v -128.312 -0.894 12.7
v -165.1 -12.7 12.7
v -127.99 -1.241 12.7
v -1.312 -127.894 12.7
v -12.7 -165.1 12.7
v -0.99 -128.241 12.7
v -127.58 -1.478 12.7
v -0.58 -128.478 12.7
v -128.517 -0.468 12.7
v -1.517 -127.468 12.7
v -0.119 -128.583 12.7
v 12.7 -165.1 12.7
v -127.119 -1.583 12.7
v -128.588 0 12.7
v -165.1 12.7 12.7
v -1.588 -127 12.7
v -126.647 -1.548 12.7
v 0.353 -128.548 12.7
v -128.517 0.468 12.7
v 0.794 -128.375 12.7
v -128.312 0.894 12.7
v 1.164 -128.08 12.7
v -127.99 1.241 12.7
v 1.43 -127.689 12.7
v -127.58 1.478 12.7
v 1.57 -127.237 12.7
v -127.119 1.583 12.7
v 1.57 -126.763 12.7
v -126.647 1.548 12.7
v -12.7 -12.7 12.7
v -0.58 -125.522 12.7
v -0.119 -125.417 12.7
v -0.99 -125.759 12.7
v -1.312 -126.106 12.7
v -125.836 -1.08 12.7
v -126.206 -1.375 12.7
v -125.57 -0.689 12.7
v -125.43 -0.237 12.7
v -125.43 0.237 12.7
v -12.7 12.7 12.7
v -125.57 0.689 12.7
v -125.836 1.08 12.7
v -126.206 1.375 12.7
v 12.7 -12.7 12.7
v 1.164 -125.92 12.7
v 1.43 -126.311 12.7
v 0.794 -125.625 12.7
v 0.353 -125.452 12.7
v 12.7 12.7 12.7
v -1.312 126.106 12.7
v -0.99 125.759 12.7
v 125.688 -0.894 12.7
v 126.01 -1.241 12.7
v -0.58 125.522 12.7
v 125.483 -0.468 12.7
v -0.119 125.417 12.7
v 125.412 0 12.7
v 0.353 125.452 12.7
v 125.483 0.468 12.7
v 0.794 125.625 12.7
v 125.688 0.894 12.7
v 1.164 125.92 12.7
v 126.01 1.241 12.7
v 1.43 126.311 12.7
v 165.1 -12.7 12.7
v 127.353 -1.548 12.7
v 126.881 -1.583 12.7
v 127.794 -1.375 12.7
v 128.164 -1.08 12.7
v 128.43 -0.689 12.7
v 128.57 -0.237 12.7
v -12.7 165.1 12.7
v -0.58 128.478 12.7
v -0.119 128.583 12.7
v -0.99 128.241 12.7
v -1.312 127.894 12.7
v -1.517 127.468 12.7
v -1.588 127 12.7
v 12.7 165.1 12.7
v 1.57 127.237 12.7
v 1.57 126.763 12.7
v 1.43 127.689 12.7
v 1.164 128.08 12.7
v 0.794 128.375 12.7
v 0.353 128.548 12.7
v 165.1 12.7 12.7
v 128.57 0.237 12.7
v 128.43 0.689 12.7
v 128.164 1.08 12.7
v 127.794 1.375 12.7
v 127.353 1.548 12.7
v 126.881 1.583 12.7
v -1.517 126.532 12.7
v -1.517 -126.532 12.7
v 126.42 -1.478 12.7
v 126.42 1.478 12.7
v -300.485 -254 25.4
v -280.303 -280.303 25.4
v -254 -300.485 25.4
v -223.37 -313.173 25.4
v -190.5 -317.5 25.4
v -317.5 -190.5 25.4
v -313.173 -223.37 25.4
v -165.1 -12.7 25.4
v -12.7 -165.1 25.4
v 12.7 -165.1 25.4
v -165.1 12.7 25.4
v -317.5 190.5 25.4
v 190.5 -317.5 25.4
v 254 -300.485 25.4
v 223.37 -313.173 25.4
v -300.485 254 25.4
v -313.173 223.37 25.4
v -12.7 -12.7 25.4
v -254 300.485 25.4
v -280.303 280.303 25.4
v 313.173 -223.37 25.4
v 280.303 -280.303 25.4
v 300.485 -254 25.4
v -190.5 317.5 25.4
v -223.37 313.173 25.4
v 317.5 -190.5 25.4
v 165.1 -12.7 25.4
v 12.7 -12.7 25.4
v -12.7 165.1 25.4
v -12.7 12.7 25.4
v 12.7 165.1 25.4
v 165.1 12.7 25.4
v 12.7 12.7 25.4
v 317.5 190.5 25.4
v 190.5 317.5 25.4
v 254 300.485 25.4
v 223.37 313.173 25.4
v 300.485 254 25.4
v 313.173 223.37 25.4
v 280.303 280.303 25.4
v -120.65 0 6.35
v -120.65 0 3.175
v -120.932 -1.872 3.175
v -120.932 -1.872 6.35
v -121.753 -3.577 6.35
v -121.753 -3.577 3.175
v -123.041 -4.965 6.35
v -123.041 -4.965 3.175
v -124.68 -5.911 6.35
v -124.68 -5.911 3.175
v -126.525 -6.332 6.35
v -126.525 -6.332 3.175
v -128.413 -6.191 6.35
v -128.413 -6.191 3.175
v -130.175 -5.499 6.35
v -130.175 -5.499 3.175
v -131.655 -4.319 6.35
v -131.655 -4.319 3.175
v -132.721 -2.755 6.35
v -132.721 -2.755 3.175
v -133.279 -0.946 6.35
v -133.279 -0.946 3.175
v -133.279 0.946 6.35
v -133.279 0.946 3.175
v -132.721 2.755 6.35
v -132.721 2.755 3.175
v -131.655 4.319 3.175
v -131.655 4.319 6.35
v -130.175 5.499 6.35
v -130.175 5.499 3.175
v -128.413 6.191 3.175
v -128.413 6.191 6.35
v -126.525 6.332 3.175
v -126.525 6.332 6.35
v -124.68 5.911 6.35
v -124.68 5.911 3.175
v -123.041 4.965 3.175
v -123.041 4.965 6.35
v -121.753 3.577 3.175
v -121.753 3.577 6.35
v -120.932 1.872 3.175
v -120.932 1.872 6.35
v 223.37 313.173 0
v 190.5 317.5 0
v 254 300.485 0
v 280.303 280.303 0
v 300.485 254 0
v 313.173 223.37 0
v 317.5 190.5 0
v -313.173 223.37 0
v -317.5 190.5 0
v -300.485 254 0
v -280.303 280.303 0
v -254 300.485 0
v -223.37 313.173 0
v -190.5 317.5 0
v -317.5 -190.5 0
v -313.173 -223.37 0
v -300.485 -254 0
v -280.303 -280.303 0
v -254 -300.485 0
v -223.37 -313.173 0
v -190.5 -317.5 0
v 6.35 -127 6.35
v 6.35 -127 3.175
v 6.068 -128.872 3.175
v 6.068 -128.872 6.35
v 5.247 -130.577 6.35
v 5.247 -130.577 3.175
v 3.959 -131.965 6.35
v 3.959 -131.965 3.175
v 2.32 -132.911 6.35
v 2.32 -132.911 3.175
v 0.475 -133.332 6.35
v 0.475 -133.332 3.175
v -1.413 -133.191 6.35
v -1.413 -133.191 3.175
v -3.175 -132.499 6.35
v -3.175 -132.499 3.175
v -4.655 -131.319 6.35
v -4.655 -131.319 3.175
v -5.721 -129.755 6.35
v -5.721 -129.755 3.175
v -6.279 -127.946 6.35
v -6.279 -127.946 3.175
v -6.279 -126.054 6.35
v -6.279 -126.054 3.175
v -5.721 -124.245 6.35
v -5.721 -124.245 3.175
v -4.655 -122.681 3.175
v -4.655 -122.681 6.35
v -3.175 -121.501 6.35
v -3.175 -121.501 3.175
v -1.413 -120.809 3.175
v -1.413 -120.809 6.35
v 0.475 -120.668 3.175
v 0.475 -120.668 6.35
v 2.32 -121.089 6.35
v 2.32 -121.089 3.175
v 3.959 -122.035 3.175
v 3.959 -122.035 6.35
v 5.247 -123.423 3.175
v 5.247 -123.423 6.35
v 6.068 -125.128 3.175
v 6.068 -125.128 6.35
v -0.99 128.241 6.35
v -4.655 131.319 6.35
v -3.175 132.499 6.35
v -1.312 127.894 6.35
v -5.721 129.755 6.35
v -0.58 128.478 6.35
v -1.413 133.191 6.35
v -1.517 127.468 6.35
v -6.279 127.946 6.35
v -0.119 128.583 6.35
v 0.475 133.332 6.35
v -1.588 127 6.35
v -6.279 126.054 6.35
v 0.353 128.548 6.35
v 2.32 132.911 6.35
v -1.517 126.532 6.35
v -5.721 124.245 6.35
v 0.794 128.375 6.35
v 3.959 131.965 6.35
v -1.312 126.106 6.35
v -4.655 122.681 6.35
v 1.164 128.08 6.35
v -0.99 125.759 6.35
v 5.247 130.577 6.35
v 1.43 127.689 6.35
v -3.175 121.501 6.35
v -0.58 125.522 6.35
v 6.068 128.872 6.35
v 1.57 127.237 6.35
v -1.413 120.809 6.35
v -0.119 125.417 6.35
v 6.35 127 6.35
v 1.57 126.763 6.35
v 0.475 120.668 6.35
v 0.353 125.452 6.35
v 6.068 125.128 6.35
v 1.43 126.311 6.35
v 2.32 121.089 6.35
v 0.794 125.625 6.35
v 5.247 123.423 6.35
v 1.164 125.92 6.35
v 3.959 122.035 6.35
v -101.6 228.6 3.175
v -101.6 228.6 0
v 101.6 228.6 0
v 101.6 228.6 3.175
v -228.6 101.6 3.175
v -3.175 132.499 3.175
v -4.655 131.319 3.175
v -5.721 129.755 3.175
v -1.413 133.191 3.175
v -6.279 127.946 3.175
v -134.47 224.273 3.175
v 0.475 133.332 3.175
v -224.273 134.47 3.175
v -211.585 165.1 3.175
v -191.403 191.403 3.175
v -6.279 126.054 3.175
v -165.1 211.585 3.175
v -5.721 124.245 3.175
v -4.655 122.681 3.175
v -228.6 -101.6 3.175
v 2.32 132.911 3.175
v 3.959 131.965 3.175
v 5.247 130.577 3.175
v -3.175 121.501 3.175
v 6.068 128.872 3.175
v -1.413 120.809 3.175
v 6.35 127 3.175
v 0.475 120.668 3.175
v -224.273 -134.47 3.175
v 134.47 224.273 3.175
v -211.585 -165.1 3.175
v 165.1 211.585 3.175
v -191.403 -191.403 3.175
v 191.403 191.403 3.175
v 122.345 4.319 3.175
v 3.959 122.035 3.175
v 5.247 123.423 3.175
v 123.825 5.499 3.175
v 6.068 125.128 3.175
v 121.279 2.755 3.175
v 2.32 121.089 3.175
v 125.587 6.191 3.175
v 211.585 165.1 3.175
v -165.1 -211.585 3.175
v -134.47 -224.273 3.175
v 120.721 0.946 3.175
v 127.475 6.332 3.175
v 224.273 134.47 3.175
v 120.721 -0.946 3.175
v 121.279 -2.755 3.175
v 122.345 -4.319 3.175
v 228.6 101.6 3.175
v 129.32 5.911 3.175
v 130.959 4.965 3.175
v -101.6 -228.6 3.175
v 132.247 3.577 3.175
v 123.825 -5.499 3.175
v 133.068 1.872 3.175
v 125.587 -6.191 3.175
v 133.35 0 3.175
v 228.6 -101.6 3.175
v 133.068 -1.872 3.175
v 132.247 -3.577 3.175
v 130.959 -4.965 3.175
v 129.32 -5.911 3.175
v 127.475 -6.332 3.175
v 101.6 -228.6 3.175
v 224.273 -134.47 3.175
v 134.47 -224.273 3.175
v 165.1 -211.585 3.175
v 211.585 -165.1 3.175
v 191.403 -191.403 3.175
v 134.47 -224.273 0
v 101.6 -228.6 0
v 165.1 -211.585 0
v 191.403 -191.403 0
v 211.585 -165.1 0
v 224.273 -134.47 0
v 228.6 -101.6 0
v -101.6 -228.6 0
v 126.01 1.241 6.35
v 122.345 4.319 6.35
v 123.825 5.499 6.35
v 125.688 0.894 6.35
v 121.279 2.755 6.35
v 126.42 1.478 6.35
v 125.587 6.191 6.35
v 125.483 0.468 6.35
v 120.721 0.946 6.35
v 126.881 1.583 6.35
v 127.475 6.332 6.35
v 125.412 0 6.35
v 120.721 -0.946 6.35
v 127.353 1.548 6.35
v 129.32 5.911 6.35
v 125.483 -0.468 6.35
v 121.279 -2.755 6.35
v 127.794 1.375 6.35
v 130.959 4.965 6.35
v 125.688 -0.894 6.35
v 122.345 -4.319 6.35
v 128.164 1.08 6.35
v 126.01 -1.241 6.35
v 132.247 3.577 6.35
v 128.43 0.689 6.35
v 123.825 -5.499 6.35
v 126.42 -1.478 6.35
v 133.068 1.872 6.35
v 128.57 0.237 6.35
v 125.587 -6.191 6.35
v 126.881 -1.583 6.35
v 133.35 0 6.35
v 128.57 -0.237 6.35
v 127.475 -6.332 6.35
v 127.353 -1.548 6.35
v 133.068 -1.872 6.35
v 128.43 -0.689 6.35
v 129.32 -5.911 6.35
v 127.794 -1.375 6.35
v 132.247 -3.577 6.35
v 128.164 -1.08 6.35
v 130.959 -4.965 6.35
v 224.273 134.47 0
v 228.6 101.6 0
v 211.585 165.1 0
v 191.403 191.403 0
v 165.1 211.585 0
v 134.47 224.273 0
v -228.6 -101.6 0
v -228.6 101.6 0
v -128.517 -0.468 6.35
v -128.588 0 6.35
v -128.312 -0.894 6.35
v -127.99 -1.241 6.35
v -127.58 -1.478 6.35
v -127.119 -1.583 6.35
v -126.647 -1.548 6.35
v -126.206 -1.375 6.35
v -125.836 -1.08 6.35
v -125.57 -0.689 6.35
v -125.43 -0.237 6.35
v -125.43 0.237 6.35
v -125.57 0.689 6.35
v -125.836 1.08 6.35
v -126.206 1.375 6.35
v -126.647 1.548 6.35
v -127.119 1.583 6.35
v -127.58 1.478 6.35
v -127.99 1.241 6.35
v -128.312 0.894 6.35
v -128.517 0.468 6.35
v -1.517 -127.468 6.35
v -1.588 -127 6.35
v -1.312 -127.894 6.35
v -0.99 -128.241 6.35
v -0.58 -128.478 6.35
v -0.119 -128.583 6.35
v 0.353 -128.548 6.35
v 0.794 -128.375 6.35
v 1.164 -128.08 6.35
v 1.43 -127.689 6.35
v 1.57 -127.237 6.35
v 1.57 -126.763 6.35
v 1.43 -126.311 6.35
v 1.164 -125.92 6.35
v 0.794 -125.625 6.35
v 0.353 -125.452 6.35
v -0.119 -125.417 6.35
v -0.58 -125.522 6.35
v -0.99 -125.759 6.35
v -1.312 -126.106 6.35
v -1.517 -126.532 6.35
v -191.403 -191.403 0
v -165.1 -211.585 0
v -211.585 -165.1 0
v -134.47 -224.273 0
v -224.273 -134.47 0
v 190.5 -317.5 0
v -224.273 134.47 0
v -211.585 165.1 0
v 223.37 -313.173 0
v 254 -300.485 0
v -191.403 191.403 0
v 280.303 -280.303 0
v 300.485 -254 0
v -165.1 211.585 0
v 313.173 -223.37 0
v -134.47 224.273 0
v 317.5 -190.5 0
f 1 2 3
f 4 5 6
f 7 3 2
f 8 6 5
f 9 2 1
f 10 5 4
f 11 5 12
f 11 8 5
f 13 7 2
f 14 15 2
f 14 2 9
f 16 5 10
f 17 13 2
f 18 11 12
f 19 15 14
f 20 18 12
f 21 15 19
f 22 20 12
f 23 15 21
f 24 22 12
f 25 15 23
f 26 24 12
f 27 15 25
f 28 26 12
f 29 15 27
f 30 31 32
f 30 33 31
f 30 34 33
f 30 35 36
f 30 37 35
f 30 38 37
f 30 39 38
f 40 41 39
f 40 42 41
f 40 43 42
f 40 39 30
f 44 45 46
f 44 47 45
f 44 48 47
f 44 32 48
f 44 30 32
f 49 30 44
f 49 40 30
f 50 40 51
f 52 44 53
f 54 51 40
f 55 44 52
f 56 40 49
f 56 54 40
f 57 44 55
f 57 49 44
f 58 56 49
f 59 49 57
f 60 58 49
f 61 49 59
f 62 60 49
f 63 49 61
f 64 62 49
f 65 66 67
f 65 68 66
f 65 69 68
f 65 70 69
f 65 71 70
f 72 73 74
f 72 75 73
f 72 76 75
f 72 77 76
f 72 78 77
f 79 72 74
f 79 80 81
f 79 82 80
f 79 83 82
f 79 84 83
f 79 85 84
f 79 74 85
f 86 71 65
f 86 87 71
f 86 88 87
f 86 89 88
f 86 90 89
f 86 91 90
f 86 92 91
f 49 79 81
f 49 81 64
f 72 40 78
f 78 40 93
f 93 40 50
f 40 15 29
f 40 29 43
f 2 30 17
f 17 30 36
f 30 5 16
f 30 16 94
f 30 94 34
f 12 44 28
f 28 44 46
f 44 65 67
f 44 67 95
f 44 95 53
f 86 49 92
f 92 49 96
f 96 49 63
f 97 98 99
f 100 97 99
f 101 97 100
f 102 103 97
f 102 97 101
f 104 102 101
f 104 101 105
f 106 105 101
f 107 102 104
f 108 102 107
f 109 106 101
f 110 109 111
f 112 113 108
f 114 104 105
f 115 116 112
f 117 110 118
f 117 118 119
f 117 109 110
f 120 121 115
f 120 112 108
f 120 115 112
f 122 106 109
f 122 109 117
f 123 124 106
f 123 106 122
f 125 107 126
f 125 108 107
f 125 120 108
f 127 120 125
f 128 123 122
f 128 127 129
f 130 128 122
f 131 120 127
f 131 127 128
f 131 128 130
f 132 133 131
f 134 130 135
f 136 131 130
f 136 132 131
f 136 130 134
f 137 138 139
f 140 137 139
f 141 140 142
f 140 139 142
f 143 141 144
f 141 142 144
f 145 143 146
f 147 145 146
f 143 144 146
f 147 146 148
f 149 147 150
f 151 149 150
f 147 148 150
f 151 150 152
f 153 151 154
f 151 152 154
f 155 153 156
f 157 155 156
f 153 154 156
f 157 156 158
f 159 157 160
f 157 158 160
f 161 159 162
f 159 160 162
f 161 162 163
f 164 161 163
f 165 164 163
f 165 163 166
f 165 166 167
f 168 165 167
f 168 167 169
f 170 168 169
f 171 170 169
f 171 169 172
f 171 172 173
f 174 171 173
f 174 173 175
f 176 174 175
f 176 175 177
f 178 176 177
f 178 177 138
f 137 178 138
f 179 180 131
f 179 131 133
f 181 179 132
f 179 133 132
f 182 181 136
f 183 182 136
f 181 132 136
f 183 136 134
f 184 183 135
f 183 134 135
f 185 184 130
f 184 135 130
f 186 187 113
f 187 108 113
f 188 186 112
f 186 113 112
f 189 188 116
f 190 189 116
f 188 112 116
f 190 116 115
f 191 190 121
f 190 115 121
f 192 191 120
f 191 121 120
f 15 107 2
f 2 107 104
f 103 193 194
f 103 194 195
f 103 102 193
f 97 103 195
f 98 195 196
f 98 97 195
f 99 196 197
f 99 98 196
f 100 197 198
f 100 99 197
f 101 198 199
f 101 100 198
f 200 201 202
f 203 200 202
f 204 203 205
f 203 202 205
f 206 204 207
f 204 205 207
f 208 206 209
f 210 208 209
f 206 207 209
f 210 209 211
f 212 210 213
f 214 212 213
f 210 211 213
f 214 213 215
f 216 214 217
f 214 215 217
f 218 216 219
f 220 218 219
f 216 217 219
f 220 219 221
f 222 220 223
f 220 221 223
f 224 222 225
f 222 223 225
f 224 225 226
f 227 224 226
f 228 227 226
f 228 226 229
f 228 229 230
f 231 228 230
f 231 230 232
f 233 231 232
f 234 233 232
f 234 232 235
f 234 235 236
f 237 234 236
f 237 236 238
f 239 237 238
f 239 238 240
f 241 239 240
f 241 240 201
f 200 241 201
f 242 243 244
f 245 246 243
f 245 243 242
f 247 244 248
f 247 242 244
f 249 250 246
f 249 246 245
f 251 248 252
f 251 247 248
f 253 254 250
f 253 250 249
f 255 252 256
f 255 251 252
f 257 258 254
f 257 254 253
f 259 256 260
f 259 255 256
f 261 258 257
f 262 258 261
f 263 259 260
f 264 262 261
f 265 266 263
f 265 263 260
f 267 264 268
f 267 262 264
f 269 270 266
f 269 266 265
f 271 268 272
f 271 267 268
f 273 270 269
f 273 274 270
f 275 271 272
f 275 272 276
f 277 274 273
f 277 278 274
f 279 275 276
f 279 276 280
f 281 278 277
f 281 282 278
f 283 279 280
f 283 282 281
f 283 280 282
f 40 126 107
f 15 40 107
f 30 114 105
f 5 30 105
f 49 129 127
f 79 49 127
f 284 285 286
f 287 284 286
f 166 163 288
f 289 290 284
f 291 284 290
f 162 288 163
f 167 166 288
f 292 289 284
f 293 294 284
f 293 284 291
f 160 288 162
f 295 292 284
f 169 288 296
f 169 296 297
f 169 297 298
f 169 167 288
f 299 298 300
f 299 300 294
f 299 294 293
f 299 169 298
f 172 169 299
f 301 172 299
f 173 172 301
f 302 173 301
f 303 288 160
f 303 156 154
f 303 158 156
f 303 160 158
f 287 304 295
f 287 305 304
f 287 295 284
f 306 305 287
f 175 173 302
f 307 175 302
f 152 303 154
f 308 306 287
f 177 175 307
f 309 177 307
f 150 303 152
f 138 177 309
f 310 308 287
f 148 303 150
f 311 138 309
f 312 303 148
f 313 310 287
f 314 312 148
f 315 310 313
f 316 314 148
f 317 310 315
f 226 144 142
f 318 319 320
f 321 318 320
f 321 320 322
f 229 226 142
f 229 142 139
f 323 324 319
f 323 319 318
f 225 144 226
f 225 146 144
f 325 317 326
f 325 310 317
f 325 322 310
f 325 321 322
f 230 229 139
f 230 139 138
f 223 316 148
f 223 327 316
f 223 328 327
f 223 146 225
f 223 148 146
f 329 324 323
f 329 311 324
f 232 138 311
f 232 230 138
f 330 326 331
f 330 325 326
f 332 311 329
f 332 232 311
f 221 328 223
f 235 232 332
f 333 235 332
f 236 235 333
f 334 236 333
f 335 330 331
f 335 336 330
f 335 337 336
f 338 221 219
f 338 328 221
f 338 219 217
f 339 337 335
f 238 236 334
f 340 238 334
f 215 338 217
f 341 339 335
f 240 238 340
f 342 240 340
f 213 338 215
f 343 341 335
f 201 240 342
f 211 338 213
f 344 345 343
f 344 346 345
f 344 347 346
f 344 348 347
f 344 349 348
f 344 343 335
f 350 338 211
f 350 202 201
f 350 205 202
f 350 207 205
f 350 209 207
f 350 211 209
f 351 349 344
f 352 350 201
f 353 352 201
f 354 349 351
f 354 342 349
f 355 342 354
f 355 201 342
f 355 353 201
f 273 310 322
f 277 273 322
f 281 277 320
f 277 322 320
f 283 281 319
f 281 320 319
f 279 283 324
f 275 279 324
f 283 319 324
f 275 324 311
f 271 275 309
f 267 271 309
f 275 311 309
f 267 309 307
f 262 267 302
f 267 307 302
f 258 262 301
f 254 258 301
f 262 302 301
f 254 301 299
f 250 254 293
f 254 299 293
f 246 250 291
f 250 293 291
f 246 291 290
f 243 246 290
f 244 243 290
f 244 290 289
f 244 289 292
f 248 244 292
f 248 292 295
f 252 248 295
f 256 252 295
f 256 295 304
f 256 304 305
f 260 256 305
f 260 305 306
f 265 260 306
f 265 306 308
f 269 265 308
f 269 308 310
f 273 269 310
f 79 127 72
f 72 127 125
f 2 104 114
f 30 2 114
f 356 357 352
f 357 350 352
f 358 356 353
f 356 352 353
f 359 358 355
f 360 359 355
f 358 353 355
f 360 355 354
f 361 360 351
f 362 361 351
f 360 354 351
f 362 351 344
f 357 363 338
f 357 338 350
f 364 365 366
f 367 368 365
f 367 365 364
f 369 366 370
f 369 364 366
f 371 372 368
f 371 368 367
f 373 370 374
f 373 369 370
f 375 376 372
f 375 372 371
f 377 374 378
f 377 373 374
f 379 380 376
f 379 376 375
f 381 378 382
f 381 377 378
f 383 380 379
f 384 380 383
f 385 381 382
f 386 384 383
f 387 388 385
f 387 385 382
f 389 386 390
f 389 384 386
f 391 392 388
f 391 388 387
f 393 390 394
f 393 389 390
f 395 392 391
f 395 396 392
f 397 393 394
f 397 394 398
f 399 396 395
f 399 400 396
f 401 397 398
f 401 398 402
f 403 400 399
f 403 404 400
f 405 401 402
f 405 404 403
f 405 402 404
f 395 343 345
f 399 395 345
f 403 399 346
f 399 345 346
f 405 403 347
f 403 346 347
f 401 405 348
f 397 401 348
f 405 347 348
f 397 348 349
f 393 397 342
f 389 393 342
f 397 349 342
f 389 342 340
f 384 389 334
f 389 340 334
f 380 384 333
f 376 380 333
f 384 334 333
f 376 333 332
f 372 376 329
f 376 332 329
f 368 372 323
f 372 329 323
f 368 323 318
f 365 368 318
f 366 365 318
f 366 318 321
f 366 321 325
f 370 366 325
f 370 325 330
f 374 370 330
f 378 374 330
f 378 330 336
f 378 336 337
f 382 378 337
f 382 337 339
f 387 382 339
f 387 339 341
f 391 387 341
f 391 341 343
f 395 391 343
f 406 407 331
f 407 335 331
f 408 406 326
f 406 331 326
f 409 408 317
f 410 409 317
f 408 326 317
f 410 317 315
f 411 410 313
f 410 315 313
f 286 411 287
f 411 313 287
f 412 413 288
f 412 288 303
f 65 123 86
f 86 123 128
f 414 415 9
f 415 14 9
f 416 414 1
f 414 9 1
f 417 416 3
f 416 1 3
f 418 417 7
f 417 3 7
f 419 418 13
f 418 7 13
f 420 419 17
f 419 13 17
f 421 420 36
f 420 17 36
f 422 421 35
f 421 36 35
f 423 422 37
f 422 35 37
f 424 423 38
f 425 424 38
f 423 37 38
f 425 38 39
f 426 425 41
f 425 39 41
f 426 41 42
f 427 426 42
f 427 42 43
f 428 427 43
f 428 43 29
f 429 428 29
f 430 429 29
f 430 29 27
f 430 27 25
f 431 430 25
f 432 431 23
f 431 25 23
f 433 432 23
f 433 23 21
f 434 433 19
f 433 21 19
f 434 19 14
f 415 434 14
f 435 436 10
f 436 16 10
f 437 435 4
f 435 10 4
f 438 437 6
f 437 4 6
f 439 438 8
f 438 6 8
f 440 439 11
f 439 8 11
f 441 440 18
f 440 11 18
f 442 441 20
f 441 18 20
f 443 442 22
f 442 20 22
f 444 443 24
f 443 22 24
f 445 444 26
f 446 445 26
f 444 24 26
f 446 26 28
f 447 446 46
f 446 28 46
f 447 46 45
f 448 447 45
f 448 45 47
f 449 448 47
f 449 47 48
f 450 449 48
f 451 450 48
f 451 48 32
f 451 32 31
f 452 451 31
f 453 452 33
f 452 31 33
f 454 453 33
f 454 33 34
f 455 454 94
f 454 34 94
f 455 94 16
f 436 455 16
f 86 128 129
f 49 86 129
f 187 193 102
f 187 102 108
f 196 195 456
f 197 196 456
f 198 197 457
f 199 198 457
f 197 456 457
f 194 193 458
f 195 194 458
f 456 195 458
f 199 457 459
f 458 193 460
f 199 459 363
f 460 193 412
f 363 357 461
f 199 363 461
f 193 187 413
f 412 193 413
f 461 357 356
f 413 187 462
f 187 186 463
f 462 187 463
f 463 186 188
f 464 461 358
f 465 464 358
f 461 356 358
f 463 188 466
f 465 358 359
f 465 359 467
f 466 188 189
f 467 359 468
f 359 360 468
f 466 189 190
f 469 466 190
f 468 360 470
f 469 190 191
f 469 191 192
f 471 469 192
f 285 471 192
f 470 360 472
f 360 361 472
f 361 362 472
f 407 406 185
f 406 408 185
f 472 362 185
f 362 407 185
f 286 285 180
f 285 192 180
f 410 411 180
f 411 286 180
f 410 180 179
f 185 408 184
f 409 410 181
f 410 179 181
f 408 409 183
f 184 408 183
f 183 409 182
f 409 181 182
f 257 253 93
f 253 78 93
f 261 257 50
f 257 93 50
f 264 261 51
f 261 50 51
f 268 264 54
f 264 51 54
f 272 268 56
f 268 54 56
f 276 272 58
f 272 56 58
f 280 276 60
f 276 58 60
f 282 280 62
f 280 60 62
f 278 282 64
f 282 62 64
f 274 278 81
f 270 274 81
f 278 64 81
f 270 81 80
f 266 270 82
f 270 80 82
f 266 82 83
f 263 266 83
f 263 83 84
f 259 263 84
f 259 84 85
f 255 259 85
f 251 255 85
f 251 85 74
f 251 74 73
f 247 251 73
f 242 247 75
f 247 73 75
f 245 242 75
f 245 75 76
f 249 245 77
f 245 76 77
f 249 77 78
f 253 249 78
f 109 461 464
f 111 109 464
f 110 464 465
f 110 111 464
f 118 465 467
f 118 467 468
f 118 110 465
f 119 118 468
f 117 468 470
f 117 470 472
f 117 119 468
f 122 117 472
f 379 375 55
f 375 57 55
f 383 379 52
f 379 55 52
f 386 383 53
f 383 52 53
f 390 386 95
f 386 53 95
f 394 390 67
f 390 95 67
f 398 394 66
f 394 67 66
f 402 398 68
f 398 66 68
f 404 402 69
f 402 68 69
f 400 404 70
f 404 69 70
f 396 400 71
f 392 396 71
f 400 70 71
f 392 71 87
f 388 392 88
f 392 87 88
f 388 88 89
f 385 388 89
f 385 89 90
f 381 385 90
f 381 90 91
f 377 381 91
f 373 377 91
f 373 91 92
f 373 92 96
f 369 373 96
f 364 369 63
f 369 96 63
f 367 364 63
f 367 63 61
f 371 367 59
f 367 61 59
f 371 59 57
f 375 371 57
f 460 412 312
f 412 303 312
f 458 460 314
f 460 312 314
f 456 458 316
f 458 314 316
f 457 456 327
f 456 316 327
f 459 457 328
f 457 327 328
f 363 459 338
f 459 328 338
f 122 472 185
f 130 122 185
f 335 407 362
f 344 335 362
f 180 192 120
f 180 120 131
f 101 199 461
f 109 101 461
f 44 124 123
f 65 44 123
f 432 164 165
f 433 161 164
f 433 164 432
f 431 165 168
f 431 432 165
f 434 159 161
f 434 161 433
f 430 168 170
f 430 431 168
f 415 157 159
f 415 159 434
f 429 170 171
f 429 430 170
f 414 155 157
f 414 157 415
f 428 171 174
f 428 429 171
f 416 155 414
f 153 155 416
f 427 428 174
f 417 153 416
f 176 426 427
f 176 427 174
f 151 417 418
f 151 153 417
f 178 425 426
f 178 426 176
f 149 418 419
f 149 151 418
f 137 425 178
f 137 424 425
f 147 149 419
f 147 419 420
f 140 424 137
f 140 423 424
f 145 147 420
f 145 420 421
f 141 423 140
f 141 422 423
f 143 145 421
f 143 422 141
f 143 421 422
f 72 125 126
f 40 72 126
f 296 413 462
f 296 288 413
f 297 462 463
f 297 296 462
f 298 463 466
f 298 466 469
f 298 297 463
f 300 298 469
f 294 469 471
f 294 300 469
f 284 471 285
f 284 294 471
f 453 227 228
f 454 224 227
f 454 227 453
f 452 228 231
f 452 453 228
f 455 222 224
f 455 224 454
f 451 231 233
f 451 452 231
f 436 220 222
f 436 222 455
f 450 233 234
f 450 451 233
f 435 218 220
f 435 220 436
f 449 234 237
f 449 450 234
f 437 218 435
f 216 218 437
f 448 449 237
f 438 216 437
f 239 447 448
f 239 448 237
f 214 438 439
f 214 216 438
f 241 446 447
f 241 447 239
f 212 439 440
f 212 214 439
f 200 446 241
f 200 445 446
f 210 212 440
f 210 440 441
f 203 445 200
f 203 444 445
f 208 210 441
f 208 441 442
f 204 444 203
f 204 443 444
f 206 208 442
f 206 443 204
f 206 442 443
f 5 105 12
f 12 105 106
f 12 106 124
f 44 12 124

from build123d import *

# Parameters (mm, degrees)
F0_W           = 635
F0_H           = 635
F1_DEPTH       = 25.4
F9_DEPTH       = 12.7
F2_R           = 127
F3_W           = 457.2
F3_H           = 457.2
F4_DEPTH       = 3.175
F5_R           = 127
F7_D           = 3.175
F7_DEPTH       = 63.5
F7_CBORE_D     = 12.7
F7_CBORE_DEPTH = 3.175


with BuildPart() as f1:
    # F0 (on Top) → F1 (new body)
    with BuildSketch(Plane.XY):
        Rectangle(F0_W, F0_H)
    extrude(amount=F1_DEPTH)

    # F8 (on face) → F9 (cut)
    with BuildSketch(Plane.XY.offset(25.4)):
        Polygon((12.7, 12.7), (12.7, 165.1), (-12.7, 165.1), (-12.7, 12.7), (-165.1, 12.7), (-165.1, -12.7), (-12.7, -12.7), (-12.7, -165.1), (12.7, -165.1), (12.7, -12.7), (165.1, -12.7), (165.1, 12.7), align=None)
    extrude(amount=-F9_DEPTH, mode=Mode.SUBTRACT)

    # F2
    f2_edges = [f1.edges().sort_by_distance(p)[0] for p in [
        (-317.5, -317.5, 12.7),
        (317.5, -317.5, 12.7),
        (317.5, 317.5, 12.7),
        (-317.5, 317.5, 12.7),
    ]]
    fillet(f2_edges, radius=F2_R)

    # F3 (on face) → F4 (cut)
    with BuildSketch(Plane(origin=(0, 0, 0), x_dir=(1, 0, 0), z_dir=(0, 0, -1))):
        Rectangle(F3_W, F3_H)
    extrude(amount=-F4_DEPTH, mode=Mode.SUBTRACT)

    # F5
    f5_edges = [f1.edges().sort_by_distance(p)[0] for p in [
        (-228.6, -228.6, 1.5875),
        (228.6, -228.6, 1.5875),
        (228.6, 228.6, 1.5875),
        (-228.6, 228.6, 1.5875),
    ]]
    fillet(f5_edges, radius=F5_R)

    # F7
    with Locations(Plane(origin=(0, 0, 3.175), x_dir=(1, 0, 0), z_dir=(0, 0, -1))):
        with Locations((-127, 0), (127, 0), (0, 127), (0, -127)):
            CounterBoreHole(F7_D / 2, F7_CBORE_D / 2, F7_CBORE_DEPTH, depth=F7_DEPTH)


solid = f1.part
